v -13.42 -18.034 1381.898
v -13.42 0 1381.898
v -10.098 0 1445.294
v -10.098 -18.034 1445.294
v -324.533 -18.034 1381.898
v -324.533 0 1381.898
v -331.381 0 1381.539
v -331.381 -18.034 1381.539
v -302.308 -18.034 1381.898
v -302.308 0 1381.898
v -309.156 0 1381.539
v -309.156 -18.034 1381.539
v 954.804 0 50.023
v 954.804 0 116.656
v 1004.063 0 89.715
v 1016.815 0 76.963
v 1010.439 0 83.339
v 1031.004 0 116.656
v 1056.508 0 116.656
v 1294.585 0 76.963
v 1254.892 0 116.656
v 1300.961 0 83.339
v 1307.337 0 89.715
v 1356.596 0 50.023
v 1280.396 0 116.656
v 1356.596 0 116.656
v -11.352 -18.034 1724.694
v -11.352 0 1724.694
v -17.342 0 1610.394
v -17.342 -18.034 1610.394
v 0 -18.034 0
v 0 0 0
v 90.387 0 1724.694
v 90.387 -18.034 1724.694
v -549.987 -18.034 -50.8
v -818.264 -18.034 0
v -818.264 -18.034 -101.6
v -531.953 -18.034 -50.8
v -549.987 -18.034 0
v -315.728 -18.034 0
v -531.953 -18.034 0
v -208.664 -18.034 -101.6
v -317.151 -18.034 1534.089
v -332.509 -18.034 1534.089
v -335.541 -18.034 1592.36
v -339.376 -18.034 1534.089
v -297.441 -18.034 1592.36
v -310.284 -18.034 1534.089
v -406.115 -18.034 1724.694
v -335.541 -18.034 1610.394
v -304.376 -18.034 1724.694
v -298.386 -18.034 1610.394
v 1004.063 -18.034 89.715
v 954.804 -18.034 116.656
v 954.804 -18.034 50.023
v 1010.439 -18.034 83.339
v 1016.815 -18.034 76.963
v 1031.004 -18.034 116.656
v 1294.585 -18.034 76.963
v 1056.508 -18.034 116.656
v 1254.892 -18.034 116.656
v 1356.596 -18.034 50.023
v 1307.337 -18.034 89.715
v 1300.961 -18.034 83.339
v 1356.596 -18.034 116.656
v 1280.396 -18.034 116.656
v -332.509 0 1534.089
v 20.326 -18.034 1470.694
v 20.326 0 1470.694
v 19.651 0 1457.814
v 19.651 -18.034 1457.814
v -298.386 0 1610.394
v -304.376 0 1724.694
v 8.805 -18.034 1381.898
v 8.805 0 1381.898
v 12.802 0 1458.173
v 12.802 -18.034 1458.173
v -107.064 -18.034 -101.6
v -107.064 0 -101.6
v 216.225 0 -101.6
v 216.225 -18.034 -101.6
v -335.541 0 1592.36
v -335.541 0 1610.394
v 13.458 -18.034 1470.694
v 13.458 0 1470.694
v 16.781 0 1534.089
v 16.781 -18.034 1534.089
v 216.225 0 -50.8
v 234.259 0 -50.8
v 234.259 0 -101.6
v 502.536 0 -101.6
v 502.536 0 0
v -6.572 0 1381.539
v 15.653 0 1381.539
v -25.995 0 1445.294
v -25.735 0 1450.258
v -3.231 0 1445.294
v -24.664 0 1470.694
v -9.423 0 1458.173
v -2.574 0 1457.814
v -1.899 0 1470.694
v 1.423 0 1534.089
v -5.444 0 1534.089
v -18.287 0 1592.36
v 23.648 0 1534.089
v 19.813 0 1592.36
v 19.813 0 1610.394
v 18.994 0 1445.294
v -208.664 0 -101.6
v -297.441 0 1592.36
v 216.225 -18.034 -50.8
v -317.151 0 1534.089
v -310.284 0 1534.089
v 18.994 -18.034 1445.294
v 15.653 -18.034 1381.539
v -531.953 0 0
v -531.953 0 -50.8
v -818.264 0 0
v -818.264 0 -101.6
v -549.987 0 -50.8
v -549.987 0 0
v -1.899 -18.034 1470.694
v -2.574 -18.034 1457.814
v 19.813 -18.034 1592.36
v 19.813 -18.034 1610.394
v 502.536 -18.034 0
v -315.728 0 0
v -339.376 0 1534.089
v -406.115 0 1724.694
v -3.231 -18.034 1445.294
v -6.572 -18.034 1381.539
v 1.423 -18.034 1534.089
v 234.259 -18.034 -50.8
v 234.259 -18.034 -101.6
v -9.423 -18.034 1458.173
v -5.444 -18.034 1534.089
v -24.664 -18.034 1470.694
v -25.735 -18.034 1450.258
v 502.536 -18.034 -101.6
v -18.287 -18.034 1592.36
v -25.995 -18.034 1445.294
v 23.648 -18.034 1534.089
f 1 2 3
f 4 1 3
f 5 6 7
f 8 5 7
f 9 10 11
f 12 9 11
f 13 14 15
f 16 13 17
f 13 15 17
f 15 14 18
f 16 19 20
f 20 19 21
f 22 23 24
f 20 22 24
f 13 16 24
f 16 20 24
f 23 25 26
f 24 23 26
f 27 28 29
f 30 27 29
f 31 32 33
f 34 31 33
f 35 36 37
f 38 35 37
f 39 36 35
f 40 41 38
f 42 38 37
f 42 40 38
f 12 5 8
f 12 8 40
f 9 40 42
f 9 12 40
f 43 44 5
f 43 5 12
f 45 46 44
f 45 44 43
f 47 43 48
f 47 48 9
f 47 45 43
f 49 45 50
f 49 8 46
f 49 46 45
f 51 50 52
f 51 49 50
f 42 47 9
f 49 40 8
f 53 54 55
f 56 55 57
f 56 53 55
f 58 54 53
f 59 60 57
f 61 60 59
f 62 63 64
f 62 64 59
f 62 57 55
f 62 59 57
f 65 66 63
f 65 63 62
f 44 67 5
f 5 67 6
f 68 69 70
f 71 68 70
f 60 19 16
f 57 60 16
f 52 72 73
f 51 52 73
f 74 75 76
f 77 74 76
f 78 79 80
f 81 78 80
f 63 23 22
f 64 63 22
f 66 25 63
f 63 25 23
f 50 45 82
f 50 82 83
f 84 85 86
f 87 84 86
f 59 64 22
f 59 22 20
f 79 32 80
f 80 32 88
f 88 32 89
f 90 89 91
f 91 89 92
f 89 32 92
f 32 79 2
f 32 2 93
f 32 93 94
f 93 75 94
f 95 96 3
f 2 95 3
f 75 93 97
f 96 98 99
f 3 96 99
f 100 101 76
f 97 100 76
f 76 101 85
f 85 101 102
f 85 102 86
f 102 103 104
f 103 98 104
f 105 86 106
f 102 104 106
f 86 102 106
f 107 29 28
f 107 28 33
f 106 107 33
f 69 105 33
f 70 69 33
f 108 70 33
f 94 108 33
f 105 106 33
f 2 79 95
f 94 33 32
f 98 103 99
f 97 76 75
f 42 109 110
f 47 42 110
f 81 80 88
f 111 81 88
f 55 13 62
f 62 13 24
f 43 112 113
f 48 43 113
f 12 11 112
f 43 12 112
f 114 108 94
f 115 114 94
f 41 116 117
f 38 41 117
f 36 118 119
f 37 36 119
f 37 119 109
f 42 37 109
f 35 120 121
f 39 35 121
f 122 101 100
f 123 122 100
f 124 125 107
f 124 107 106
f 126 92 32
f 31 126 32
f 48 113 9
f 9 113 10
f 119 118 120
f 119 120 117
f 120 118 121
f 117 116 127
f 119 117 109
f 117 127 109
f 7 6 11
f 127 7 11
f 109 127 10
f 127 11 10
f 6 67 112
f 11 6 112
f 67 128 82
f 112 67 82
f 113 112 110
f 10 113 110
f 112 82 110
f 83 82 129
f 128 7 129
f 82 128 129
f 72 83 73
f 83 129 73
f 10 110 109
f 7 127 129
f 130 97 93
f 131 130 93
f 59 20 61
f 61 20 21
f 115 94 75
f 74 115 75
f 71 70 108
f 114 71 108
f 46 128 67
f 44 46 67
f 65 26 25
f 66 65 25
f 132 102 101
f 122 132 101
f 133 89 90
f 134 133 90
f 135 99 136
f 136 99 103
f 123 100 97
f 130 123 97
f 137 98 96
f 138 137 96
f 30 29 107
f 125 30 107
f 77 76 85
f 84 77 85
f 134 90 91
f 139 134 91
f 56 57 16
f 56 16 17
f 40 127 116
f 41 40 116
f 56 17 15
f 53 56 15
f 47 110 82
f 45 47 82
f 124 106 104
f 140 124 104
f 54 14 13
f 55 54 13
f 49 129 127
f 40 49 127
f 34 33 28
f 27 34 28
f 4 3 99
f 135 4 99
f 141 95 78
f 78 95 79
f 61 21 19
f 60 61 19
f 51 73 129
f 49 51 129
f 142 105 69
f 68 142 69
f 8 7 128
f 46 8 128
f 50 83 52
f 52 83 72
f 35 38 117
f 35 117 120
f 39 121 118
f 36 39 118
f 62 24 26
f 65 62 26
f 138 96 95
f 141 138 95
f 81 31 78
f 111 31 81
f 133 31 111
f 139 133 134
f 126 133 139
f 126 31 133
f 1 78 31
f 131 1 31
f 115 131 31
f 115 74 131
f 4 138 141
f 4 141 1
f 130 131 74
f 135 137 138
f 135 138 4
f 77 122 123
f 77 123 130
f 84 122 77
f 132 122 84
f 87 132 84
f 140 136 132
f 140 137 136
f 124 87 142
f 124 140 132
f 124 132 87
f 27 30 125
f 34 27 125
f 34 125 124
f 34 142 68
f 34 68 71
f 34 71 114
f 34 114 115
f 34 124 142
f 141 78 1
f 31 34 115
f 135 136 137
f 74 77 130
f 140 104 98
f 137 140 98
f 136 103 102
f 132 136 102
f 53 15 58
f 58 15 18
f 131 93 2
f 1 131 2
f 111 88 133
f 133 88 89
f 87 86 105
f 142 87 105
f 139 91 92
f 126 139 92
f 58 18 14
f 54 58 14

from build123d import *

# Parameters (mm, degrees)
F1_DEPTH = 18.034


# Not quite as in the source:
# - a feature names something its author has since deleted; it is built from what else it names


with BuildPart() as f1:
    # F0 (on Front) → F1 (new body)
    with BuildSketch(Plane.XZ):
        Polygon((502.5359392715, 0), (0, 0), (90.3873664019, 1724.6936931592), (39.5176512252, 1724.6936931592), (39.5176512252, 1267.4936931592), (-19.4161146469, 1267.4936931592), (-35.3129006397, 1267.4936931592), (-107.0640607285, -101.6), (216.2251596299, -101.6), (216.2251596299, -50.8), (234.2591596299, -50.8), (234.2591596299, -101.6), (502.5359392715, -101.6), align=None)
        Polygon((39.5176512252, 1267.4936931592), (39.5176512252, 1724.6936931592), (-11.3520639514, 1724.6936931592), (-17.3422731235, 1610.3936931592), (19.8126049849, 1610.3936931592), (19.8126049849, 1592.3596931592), (-18.2873950151, 1592.3596931592), (-24.6636398893, 1470.6936931592), (-8.7668538966, 1470.6936931592), (-5.4444328278, 1534.0892637075), (1.422978721, 1534.0892637075), (-1.8994423478, 1470.6936931592), (13.4581461034, 1470.6936931592), (16.7805671722, 1534.0892637075), (23.647978721, 1534.0892637075), (20.3255576522, 1470.6936931592), (28.9262730809, 1470.6936931592), (28.9262730809, 1445.2936931592), (18.9944000584, 1445.2936931592), (15.6531687901, 1381.539202623), (8.8045674408, 1381.8981226109), (12.1269885096, 1445.2936931592), (-3.2305999416, 1445.2936931592), (-6.5718312099, 1381.539202623), (-13.4204325592, 1381.8981226109), (-19.4161146469, 1267.4936931592), align=None)
        Polygon((-35.3129006397, 1267.4936931592), (-19.4161146469, 1267.4936931592), (-13.4204325592, 1381.8981226109), (-10.0980114904, 1445.2936931592), (-25.9947974831, 1445.2936931592), align=None)
        Polygon((-8.7668538966, 1470.6936931592), (-24.6636398893, 1470.6936931592), (-25.7346158366, 1450.2582547212), (-10.0980114904, 1445.2936931592), (-9.4230275025, 1458.1731548939), align=None)
        Polygon((-25.7346158366, 1450.2582547212), (-25.9947974831, 1445.2936931592), (-10.0980114904, 1445.2936931592), align=None)
        Polygon((-2.5744262358, 1457.8142333288), (-3.2305999416, 1445.2936931592), (12.1269885096, 1445.2936931592), (12.8019724807, 1458.173154574), (13.4581461034, 1470.6936931592), (-1.8994423478, 1470.6936931592), align=None)
        Polygon((19.6505737569, 1457.8142331896), (18.9944000584, 1445.2936931592), (28.9262730809, 1445.2936931592), (28.9262730809, 1470.6936931592), (20.3255576522, 1470.6936931592), align=None)
    extrude(amount=F1_DEPTH)


with BuildPart() as f1b:
    # F0 (on Front) → F1, piece 2 (new body)
    with BuildSketch(Plane.XZ):
        Polygon((954.8041553716, 50.0226186452), (964.3706549533, 50.0226186452), (977.1226186452, 62.7745823371), (1004.0633870084, 89.7153507003), (1031.0041553716, 116.6561190635), (954.8041553716, 116.6561190635), align=None)
        Polygon((977.1226186452, 62.7745823371), (964.3706549533, 50.0226186452), (989.8745823371, 50.0226186452), (983.4986004912, 56.3986004912), align=None)
        Polygon((983.4986004912, 56.3986004912), (989.8745823371, 50.0226186452), (1016.8153507003, 76.9633870084), (1010.4393688544, 83.3393688544), (1004.0633870084, 89.7153507003), (977.1226186452, 62.7745823371), align=None)
        Polygon((1016.8153507003, 76.9633870084), (989.8745823371, 50.0226186452), (1155.7, 50.0226186452), (1321.5254176629, 50.0226186452), (1294.5846492997, 76.9633870084), (1254.8919172446, 116.6561190635), (1155.7, 116.6561190635), (1056.5080827554, 116.6561190635), align=None)
        Polygon((1294.5846492997, 76.9633870084), (1321.5254176629, 50.0226186452), (1347.0293450467, 50.0226186452), (1307.3366129916, 89.7153507003), (1300.9606311456, 83.3393688544), align=None)
        Polygon((1307.3366129916, 89.7153507003), (1347.0293450467, 50.0226186452), (1356.5958446284, 50.0226186452), (1356.5958446284, 116.6561190635), (1280.3958446284, 116.6561190635), align=None)
    extrude(amount=F1_DEPTH)


with BuildPart() as f1c:
    # F0 (on Front) → F1, piece 3 (new body)
    with BuildSketch(Plane.XZ):
        Polygon((-531.953281087, 0), (-531.953281087, -50.8), (-549.987281087, -50.8), (-549.987281087, 0), (-818.2640607285, 0), (-818.2640607285, -101.6), (-208.6640607285, -101.6), (-297.440726442, 1592.3596931592), (-335.540726442, 1592.3596931592), (-335.540726442, 1610.3936931592), (-298.3858483336, 1610.3936931592), (-304.3760575056, 1724.6936931592), (-406.115487859, 1724.6936931592), (-315.7281214571, 0), align=None)
        Polygon((-324.5326888979, 1381.8981226109), (-331.3812902472, 1381.539202623), (-339.3761001781, 1534.0892637075), (-332.5086886293, 1534.0892637075), align=None, mode=Mode.SUBTRACT)
        Polygon((-317.1511001781, 1534.0892637075), (-310.2836886293, 1534.0892637075), (-302.3076888979, 1381.8981226109), (-309.1562902472, 1381.539202623), align=None, mode=Mode.SUBTRACT)
    extrude(amount=F1_DEPTH)


solid = Compound([f1.part, f1b.part, f1c.part])
